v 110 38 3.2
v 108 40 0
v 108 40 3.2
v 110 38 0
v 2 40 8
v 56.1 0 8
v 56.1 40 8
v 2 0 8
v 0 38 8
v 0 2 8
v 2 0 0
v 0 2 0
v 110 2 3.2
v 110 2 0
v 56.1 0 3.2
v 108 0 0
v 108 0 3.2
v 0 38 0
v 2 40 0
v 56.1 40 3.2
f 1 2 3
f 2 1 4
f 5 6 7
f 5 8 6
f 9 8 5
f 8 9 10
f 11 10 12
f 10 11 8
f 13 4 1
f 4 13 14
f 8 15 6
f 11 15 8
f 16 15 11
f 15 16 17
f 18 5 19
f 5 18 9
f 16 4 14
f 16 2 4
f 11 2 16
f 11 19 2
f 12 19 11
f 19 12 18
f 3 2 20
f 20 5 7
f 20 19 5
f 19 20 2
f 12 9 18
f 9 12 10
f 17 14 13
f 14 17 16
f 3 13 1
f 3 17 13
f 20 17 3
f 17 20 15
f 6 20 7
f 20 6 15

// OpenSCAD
$fn = 32;

// ----------------------------------------------------------------------
// Stepped bar: endstep, 110 x 40 x 8/3.2 mm
// ----------------------------------------------------------------------

// --- parameters (mm) ---
bar_l = 110;              // bar length, X
bar_w = 40;               // bar width, Y
plate_t = 8;              // thickness of the thick zone, Z
thin_t = 3.2;             // thickness of the thin zone
corner_c = 2;             // corner chamfer of the bar
step_cut = 4.8;           // material removed from the thin zone
step_x = 56.1;            // step position from the left end
depth_1 = 4.8;            // depth of cut 1 from the top face
fit_tol = 0.05;           // declared fit tolerance (prompt contract)
free_tol = 0.3;           // declared free tolerance (prompt contract)

profile = [[2, 0], [108, 0], [110, 2], [110, 38], [108, 40], [2, 40], [0, 38], [0, 2]];  // primary outline, 8 points, counter clockwise
void_1 = [[56.1, -1], [111, -1], [111, 41], [56.1, 41]];  // thin zone beyond the step, 4 points

// --- the one profile operation ---
difference() {
  linear_extrude(height = plate_t) polygon(points = profile);
  translate([0, 0, plate_t - depth_1])
    linear_extrude(height = depth_1 + 1) polygon(points = void_1);
}
